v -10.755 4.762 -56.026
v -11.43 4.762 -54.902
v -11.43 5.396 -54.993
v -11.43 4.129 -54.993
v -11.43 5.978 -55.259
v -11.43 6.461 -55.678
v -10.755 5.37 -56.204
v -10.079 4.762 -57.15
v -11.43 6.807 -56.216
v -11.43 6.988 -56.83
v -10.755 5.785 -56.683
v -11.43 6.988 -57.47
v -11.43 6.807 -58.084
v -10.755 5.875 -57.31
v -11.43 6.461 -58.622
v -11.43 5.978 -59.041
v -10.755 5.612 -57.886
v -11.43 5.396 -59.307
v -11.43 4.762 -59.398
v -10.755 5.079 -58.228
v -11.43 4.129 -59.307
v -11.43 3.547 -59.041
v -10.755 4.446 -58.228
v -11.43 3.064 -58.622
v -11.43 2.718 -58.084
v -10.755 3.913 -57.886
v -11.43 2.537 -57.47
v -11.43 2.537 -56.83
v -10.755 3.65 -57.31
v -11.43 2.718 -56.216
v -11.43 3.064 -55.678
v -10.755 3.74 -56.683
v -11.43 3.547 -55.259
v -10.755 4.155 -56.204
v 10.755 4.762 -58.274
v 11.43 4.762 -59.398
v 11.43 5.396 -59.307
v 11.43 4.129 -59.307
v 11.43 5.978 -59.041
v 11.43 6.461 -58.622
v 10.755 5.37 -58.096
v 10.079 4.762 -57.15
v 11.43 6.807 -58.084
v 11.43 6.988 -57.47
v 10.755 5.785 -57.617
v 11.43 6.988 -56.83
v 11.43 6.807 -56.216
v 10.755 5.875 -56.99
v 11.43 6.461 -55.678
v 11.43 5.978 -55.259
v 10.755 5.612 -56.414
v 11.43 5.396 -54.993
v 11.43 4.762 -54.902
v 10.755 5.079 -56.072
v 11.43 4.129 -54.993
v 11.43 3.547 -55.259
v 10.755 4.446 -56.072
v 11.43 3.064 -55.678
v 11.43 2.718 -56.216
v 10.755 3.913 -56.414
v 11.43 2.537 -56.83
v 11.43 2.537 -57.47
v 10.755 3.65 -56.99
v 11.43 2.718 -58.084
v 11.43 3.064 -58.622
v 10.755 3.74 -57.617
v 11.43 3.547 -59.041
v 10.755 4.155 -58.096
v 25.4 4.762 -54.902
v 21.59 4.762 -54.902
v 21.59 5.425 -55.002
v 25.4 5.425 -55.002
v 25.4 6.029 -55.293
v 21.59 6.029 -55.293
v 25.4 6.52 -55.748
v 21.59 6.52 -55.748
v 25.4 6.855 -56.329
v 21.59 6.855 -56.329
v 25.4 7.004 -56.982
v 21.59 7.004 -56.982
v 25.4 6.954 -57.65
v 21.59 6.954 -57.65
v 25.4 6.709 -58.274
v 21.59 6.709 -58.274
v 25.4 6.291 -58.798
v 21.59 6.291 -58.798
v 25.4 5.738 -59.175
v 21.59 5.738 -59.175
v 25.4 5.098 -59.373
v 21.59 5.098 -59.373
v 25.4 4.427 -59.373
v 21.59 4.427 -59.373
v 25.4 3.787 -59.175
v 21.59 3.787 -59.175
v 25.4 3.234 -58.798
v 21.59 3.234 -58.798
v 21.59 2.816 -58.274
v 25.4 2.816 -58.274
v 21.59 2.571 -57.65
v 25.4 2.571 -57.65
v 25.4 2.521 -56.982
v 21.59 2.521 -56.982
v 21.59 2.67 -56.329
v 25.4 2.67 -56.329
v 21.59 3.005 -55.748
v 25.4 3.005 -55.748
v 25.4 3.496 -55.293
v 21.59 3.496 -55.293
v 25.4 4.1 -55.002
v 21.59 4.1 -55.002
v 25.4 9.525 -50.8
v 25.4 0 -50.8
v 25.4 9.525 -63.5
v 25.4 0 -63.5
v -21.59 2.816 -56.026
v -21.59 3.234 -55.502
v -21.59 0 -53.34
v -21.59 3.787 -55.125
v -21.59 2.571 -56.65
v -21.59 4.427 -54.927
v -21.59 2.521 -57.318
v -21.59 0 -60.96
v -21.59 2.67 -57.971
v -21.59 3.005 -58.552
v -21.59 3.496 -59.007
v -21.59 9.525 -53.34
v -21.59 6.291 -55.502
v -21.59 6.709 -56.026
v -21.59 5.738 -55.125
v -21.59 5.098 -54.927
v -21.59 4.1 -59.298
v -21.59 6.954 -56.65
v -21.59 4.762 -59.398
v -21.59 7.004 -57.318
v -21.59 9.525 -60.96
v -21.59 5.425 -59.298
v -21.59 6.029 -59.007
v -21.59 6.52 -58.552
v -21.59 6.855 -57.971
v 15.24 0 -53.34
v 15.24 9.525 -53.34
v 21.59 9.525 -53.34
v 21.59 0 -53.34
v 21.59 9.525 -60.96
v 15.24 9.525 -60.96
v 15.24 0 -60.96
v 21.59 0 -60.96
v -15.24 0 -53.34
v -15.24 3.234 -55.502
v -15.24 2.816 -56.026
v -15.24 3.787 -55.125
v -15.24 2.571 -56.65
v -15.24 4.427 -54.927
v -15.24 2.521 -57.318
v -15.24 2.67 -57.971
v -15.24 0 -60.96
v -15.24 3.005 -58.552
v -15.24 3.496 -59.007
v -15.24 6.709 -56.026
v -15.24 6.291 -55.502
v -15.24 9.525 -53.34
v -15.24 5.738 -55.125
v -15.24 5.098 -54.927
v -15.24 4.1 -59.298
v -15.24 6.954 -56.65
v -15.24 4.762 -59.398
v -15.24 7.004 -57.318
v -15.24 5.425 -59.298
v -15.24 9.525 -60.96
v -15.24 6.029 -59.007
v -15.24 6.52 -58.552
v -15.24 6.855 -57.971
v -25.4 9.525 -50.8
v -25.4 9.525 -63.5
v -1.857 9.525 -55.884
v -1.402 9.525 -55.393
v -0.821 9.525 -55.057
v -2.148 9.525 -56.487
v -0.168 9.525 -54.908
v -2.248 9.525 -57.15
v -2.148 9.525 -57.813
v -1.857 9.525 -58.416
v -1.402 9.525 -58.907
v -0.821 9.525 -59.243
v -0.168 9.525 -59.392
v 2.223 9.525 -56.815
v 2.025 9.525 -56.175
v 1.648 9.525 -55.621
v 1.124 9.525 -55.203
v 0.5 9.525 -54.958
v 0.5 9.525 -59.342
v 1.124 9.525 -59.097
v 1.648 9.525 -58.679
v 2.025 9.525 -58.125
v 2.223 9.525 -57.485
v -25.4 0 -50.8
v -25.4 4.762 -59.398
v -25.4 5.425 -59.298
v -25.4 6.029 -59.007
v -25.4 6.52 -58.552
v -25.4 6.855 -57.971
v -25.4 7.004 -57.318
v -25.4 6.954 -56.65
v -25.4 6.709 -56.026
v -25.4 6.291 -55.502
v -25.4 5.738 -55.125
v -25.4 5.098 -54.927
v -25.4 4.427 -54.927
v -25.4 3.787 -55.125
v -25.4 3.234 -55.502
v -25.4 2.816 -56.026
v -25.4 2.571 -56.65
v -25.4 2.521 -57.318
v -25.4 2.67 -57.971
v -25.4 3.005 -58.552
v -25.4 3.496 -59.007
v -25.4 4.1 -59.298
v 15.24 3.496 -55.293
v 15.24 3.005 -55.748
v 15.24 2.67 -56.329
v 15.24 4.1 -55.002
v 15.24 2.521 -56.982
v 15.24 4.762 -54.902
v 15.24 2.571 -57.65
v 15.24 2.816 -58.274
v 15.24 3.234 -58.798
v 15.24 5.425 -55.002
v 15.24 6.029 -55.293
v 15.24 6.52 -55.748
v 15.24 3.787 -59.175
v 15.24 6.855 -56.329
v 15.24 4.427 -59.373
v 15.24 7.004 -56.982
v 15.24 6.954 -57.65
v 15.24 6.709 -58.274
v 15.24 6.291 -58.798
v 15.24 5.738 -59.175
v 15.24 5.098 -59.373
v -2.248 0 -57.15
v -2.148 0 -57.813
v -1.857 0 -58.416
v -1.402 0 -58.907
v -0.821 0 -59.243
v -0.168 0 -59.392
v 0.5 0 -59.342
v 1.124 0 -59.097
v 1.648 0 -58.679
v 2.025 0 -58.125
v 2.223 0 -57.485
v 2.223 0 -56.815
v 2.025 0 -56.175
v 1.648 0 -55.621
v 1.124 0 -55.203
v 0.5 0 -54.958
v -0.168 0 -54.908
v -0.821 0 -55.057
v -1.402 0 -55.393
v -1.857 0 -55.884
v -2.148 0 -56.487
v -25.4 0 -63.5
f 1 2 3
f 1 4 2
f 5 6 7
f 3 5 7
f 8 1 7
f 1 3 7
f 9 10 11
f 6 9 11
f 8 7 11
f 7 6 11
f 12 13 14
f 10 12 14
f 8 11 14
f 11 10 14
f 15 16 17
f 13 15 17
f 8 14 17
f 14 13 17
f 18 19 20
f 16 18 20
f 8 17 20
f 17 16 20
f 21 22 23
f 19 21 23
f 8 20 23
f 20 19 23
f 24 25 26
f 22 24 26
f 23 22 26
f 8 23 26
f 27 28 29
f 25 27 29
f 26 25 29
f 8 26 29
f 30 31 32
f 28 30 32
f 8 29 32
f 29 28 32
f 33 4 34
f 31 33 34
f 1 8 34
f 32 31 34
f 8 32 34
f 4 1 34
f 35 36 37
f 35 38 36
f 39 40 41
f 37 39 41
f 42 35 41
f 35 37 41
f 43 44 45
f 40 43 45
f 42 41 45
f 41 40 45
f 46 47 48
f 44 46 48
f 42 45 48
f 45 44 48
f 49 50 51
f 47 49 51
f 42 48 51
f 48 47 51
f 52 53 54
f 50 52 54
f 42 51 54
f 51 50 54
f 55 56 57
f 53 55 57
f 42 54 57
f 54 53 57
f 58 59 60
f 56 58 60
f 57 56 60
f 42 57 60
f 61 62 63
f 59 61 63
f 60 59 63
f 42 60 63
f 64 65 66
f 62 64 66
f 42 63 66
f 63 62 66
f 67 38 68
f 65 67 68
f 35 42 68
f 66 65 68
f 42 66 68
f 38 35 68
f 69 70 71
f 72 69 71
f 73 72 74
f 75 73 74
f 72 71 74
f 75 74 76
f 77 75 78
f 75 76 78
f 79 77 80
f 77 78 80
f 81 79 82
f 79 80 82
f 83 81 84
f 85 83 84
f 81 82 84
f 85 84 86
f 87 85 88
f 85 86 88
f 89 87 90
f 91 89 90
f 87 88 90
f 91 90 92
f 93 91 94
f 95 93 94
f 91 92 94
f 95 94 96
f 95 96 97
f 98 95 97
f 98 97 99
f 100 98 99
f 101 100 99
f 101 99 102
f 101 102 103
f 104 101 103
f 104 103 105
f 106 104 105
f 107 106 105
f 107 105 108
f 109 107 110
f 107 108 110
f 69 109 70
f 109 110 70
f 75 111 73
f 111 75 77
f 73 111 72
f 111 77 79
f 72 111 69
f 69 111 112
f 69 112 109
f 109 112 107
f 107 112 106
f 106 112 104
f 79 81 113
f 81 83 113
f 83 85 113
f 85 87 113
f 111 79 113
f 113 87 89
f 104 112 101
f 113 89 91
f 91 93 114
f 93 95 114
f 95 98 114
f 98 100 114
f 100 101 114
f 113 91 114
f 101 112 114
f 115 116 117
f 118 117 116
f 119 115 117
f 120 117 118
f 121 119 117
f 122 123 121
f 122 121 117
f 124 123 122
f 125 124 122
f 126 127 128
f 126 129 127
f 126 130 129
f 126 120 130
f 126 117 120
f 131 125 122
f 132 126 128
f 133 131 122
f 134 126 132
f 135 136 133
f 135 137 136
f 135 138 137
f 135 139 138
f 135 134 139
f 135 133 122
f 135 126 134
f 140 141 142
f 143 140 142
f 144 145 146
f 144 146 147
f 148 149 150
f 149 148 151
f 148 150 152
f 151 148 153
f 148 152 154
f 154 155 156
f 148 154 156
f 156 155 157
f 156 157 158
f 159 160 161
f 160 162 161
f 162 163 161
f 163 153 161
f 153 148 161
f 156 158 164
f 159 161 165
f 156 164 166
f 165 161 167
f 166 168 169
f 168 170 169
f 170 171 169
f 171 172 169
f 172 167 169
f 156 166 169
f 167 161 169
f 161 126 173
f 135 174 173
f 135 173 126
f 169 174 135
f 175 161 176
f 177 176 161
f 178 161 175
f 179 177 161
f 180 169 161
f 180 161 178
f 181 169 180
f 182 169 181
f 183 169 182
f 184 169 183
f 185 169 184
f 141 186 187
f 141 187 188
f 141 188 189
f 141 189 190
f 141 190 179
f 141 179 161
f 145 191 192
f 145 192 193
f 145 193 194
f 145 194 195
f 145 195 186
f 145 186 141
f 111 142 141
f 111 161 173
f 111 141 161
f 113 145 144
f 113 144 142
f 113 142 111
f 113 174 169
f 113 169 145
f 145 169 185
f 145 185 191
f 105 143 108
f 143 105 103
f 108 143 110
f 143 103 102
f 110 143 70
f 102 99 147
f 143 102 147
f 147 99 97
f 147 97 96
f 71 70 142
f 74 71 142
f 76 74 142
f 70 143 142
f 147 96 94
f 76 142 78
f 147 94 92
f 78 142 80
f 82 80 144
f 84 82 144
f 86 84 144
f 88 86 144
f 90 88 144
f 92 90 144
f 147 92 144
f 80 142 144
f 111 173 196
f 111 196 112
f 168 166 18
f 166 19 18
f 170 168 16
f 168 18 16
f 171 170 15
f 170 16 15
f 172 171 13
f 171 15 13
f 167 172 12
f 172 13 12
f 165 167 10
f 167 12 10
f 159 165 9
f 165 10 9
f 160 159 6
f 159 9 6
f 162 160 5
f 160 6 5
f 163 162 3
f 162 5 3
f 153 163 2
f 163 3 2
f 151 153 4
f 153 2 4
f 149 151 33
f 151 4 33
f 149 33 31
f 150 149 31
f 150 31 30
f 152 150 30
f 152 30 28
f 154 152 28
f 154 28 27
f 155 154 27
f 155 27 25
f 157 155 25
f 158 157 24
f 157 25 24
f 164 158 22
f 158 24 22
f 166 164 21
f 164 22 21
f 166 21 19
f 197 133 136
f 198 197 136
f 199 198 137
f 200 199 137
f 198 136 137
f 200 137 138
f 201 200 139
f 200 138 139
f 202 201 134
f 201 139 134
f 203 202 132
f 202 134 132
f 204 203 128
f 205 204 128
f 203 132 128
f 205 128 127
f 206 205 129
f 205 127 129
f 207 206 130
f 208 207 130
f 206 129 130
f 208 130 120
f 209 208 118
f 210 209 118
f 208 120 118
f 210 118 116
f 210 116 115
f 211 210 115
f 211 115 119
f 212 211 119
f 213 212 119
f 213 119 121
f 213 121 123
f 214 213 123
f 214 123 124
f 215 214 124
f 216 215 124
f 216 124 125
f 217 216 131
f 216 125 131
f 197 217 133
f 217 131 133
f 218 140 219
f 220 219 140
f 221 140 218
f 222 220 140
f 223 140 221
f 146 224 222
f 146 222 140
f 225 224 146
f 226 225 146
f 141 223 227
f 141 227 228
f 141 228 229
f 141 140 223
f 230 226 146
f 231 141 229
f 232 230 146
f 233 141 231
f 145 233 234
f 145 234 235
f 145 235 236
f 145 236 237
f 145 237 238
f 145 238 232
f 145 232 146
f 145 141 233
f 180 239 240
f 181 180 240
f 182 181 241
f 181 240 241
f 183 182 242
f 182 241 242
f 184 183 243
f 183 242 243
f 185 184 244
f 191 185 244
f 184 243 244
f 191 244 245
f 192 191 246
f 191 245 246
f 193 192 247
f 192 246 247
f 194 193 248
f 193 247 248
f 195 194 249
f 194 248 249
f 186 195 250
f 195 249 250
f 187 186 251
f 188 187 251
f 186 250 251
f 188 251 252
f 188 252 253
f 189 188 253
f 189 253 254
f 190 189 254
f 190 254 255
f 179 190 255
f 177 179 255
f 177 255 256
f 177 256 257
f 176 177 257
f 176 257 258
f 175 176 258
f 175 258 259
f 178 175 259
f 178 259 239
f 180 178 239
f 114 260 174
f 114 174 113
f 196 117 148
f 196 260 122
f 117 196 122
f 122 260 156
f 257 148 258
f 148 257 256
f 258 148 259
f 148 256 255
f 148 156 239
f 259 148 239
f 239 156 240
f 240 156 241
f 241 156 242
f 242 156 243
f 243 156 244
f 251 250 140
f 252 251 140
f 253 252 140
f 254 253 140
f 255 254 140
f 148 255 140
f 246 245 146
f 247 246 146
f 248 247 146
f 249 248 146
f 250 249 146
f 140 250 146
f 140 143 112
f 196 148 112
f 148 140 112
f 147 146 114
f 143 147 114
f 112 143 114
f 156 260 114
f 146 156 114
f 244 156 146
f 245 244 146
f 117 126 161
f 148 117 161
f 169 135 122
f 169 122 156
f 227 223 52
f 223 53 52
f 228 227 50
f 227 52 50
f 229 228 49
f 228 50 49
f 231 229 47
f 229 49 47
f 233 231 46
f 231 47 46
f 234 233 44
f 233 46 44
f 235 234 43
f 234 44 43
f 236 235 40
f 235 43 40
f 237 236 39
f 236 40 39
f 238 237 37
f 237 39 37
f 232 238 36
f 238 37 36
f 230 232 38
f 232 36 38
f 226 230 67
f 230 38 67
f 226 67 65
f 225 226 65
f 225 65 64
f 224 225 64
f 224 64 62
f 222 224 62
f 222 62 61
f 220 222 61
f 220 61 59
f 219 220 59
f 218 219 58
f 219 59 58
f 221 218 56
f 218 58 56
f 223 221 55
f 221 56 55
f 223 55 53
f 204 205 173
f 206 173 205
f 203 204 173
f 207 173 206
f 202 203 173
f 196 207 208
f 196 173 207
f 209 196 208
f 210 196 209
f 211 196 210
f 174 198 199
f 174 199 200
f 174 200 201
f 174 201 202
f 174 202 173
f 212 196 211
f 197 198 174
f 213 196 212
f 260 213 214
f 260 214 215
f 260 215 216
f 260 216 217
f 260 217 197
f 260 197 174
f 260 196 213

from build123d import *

# Parameters (mm, degrees)
SKETCH1_W                 = 50.8
SKETCH1_H                 = 127
BOSS_EXTRUDE1_DEPTH       = 9.525
SKETCH2_W                 = 50.8
SKETCH2_H                 = 152.4
CUT_EXTRUDE1_DEPTH        = 70.051688068
F_8_CLEARANCE_HOLE1_D     = 4.4958
F_8_CLEARANCE_HOLE2_D     = 4.4958
F_8_CLEARANCE_HOLE2_DEPTH = 13.97
F_8_CLEARANCE_HOLE2_TIP   = 1.350674586
F_8_CLEARANCE_HOLE3_D     = 4.4958
F_8_CLEARANCE_HOLE3_DEPTH = 13.97
F_8_CLEARANCE_HOLE3_TIP   = 1.350674586
SKETCH12_W                = 6.35
SKETCH12_H                = 7.62
CUT_EXTRUDE2_DEPTH        = 70.051688068


with BuildPart() as part:
    # Sketch1 → Boss-Extrude1 (new body)
    with BuildSketch(Plane(origin=(0, 0, 0), x_dir=(1, 0, 0), z_dir=(0, 1, 0))):
        Rectangle(SKETCH1_W, SKETCH1_H)
    extrude(amount=BOSS_EXTRUDE1_DEPTH)

    # Sketch2 → Cut-Extrude1 (cut, through all)
    with BuildSketch(Plane(origin=(0, 9.525, 0), x_dir=(1, 0, 0), z_dir=(0, 1, 0))):
        with Locations((0, -25.4)):
            Rectangle(SKETCH2_W, SKETCH2_H)
    extrude(amount=-CUT_EXTRUDE1_DEPTH, mode=Mode.SUBTRACT)

    # #8 Clearance Hole1 (through all)
    with Locations(Plane(origin=(0, 9.525, 0), x_dir=(1, 0, 0), z_dir=(0, 1, 0))):
        with Locations((0, 57.15)):
            Hole(F_8_CLEARANCE_HOLE1_D / 2)

    # #8 Clearance Hole2
    with Locations(Plane.ZY.offset(25.4)):
        with Locations((-57.15, 4.7625)):
            Hole(F_8_CLEARANCE_HOLE2_D / 2, depth=F_8_CLEARANCE_HOLE2_DEPTH)
            with Locations((0, 0, -(F_8_CLEARANCE_HOLE2_DEPTH + F_8_CLEARANCE_HOLE2_TIP / 2))):  # 118° drill point
                Cone(0, F_8_CLEARANCE_HOLE2_D / 2, F_8_CLEARANCE_HOLE2_TIP, mode=Mode.SUBTRACT)

    # #8 Clearance Hole3
    with Locations(Plane(origin=(25.4, 0, 0), x_dir=(0, 0, -1), z_dir=(1, 0, 0))):
        with Locations((57.15, 4.7625)):
            Hole(F_8_CLEARANCE_HOLE3_D / 2, depth=F_8_CLEARANCE_HOLE3_DEPTH)
            with Locations((0, 0, -(F_8_CLEARANCE_HOLE3_DEPTH + F_8_CLEARANCE_HOLE3_TIP / 2))):  # 118° drill point
                Cone(0, F_8_CLEARANCE_HOLE3_D / 2, F_8_CLEARANCE_HOLE3_TIP, mode=Mode.SUBTRACT)

    # Sketch12 → Cut-Extrude2 (cut, through all)
    with BuildSketch(Plane(origin=(0, 9.525, 0), x_dir=(1, 0, 0), z_dir=(0, 1, 0))):
        with Locations((-18.415, 57.15)):
            Rectangle(SKETCH12_W, SKETCH12_H)
        with Locations((18.415, 57.15)):
            Rectangle(SKETCH12_W, SKETCH12_H)
    extrude(amount=-CUT_EXTRUDE2_DEPTH, mode=Mode.SUBTRACT)


solid = part.part
